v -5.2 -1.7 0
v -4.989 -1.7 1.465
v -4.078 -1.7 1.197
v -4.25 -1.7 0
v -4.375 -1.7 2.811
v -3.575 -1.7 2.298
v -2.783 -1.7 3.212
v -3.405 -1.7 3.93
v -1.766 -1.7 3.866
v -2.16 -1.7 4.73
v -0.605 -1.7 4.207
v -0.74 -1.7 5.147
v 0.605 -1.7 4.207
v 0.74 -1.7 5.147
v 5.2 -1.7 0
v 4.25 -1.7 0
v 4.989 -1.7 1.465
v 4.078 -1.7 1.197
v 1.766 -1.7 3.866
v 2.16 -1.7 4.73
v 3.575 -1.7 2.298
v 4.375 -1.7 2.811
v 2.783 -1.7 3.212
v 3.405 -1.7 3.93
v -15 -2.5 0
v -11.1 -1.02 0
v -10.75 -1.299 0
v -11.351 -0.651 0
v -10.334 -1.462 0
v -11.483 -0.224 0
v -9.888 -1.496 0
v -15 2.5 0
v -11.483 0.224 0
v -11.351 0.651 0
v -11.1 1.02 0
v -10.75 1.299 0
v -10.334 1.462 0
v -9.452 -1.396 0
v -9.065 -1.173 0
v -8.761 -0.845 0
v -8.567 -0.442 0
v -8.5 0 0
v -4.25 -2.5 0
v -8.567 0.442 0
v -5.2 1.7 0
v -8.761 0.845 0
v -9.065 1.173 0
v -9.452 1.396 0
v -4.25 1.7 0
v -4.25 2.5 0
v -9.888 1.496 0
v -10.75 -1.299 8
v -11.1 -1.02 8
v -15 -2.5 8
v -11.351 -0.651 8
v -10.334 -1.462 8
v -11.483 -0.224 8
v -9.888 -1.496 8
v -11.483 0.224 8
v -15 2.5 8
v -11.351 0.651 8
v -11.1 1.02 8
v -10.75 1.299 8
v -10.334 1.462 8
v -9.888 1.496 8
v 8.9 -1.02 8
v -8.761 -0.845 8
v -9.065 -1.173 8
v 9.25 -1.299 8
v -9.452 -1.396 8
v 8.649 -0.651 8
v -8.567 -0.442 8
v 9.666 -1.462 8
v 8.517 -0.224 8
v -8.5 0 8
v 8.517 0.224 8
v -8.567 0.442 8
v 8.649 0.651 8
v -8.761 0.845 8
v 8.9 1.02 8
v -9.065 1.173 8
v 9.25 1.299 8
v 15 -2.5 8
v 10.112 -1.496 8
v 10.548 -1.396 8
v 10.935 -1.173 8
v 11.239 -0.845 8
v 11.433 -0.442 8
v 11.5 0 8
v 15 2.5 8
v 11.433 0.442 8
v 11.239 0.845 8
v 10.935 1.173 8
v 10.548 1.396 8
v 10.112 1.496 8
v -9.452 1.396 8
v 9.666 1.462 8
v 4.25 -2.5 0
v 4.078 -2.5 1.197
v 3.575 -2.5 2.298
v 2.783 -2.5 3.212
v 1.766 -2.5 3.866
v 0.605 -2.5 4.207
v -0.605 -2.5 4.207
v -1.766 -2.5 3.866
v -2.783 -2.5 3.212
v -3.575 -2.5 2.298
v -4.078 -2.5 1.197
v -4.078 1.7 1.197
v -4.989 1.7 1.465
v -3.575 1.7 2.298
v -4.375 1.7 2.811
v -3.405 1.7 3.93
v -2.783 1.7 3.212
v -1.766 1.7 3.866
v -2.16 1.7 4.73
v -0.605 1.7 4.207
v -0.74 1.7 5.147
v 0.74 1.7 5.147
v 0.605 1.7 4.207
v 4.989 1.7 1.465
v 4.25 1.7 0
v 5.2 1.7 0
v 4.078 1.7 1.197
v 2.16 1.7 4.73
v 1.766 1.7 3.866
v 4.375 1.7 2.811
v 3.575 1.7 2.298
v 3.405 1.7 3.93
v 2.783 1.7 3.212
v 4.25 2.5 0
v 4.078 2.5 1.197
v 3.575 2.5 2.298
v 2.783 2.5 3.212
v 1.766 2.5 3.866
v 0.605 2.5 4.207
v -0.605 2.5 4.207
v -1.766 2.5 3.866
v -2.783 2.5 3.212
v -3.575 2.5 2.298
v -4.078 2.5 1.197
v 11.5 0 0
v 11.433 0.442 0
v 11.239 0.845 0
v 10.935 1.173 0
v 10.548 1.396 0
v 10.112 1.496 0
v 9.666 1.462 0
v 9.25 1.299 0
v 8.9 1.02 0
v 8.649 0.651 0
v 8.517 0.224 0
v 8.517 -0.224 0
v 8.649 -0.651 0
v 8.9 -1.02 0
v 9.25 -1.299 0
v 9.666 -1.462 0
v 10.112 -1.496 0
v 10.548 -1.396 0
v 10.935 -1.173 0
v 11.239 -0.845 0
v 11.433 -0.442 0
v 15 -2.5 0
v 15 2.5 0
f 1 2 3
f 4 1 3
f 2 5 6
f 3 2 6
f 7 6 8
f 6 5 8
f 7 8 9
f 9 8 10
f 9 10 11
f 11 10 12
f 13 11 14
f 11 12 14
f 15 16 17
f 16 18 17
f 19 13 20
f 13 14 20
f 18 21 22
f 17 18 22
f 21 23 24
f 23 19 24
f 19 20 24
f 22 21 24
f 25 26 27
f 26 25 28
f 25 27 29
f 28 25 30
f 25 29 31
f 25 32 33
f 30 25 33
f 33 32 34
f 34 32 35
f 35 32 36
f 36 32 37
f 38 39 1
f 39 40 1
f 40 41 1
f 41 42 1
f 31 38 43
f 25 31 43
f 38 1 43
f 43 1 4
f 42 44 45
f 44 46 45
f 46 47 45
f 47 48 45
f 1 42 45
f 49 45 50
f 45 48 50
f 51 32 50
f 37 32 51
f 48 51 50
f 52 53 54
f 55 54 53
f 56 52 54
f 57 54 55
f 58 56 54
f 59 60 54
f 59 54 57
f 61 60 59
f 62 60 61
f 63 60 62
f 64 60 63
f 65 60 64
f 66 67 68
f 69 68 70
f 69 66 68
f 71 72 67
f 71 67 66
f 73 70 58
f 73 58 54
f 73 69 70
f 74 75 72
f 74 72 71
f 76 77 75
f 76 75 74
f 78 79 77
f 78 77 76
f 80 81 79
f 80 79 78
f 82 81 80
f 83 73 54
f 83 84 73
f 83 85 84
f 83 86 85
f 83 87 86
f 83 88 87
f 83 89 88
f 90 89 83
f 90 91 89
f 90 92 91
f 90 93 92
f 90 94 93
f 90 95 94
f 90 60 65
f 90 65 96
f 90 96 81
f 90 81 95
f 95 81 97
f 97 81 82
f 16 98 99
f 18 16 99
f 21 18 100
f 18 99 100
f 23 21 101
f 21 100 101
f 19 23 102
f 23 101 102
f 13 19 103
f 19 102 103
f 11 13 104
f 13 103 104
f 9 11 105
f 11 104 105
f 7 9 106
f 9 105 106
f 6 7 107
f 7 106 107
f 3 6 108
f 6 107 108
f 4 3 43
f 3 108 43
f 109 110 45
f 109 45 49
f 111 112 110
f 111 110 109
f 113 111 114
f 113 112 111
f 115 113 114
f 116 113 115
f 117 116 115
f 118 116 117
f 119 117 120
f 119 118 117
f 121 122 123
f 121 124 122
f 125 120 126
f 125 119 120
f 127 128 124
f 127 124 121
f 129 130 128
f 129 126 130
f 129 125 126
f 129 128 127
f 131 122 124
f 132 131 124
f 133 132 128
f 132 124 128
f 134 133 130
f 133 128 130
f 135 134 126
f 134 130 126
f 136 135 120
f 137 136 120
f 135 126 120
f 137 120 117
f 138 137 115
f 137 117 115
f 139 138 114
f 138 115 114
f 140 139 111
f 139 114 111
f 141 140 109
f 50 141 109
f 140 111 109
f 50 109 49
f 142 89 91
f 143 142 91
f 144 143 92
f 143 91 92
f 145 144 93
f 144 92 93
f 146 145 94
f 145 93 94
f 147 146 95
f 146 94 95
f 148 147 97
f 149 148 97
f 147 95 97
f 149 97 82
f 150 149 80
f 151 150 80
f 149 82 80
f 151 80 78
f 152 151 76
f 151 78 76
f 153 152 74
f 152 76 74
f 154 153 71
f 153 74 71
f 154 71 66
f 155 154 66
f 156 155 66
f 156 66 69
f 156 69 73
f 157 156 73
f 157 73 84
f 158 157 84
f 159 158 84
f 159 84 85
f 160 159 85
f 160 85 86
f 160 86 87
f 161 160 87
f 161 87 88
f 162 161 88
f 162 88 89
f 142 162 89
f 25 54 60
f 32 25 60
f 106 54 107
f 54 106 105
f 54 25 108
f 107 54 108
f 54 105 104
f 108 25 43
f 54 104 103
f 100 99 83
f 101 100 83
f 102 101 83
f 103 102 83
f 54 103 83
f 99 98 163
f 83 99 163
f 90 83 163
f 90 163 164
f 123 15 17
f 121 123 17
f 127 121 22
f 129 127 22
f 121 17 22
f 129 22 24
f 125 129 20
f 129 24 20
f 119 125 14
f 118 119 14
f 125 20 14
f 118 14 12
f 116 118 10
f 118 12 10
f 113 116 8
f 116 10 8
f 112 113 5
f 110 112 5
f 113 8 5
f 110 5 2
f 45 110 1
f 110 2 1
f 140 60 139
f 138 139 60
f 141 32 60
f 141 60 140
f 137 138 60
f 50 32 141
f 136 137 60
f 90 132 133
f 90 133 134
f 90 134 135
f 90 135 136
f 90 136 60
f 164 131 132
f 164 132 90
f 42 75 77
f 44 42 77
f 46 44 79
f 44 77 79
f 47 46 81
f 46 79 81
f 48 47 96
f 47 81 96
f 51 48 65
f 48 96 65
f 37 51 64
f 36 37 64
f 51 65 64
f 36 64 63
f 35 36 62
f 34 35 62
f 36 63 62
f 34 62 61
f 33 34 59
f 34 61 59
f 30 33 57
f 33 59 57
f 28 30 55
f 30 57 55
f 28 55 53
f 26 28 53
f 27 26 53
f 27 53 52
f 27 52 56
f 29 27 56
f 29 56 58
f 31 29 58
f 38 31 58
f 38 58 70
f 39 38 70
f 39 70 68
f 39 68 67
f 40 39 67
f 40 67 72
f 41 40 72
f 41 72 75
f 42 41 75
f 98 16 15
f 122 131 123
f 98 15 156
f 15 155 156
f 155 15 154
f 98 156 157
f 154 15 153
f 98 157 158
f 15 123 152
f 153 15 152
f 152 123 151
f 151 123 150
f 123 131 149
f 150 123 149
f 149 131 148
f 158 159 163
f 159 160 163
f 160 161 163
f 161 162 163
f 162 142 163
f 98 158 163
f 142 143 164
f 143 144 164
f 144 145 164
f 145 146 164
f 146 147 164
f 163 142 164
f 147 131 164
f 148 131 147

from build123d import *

# Parameters (mm, degrees)
F0_W     = 30
F0_H     = 5
F1_DEPTH = 8
F2_R     = 4.25
F3_DEPTH = 5
F4_R     = 5.2
F5_DEPTH = 1.7
F6_R     = 1.5
F7_DEPTH = 8.001


with BuildPart() as f1:
    # F0 (on Top) → F1 (new body)
    with BuildSketch(Plane.XY):
        Rectangle(F0_W, F0_H)
    extrude(amount=F1_DEPTH)

    # F2 (on Front) → F3 (cut, symmetric)
    with BuildSketch(Plane.XZ):
        Circle(F2_R)
    extrude(amount=F3_DEPTH, both=True, mode=Mode.SUBTRACT)

    # F4 (on Front) → F5 (cut, symmetric)
    with BuildSketch(Plane.XZ):
        Circle(F4_R)
    extrude(amount=F5_DEPTH, both=True, mode=Mode.SUBTRACT)

    # F6 (on face) → F7 (cut, through all)
    with BuildSketch(Plane.XY.offset(8)):
        with Locations((-10, 0)):
            Circle(F6_R)
        with Locations((10, 0)):
            Circle(F6_R)
    extrude(amount=-F7_DEPTH, mode=Mode.SUBTRACT)


solid = f1.part
